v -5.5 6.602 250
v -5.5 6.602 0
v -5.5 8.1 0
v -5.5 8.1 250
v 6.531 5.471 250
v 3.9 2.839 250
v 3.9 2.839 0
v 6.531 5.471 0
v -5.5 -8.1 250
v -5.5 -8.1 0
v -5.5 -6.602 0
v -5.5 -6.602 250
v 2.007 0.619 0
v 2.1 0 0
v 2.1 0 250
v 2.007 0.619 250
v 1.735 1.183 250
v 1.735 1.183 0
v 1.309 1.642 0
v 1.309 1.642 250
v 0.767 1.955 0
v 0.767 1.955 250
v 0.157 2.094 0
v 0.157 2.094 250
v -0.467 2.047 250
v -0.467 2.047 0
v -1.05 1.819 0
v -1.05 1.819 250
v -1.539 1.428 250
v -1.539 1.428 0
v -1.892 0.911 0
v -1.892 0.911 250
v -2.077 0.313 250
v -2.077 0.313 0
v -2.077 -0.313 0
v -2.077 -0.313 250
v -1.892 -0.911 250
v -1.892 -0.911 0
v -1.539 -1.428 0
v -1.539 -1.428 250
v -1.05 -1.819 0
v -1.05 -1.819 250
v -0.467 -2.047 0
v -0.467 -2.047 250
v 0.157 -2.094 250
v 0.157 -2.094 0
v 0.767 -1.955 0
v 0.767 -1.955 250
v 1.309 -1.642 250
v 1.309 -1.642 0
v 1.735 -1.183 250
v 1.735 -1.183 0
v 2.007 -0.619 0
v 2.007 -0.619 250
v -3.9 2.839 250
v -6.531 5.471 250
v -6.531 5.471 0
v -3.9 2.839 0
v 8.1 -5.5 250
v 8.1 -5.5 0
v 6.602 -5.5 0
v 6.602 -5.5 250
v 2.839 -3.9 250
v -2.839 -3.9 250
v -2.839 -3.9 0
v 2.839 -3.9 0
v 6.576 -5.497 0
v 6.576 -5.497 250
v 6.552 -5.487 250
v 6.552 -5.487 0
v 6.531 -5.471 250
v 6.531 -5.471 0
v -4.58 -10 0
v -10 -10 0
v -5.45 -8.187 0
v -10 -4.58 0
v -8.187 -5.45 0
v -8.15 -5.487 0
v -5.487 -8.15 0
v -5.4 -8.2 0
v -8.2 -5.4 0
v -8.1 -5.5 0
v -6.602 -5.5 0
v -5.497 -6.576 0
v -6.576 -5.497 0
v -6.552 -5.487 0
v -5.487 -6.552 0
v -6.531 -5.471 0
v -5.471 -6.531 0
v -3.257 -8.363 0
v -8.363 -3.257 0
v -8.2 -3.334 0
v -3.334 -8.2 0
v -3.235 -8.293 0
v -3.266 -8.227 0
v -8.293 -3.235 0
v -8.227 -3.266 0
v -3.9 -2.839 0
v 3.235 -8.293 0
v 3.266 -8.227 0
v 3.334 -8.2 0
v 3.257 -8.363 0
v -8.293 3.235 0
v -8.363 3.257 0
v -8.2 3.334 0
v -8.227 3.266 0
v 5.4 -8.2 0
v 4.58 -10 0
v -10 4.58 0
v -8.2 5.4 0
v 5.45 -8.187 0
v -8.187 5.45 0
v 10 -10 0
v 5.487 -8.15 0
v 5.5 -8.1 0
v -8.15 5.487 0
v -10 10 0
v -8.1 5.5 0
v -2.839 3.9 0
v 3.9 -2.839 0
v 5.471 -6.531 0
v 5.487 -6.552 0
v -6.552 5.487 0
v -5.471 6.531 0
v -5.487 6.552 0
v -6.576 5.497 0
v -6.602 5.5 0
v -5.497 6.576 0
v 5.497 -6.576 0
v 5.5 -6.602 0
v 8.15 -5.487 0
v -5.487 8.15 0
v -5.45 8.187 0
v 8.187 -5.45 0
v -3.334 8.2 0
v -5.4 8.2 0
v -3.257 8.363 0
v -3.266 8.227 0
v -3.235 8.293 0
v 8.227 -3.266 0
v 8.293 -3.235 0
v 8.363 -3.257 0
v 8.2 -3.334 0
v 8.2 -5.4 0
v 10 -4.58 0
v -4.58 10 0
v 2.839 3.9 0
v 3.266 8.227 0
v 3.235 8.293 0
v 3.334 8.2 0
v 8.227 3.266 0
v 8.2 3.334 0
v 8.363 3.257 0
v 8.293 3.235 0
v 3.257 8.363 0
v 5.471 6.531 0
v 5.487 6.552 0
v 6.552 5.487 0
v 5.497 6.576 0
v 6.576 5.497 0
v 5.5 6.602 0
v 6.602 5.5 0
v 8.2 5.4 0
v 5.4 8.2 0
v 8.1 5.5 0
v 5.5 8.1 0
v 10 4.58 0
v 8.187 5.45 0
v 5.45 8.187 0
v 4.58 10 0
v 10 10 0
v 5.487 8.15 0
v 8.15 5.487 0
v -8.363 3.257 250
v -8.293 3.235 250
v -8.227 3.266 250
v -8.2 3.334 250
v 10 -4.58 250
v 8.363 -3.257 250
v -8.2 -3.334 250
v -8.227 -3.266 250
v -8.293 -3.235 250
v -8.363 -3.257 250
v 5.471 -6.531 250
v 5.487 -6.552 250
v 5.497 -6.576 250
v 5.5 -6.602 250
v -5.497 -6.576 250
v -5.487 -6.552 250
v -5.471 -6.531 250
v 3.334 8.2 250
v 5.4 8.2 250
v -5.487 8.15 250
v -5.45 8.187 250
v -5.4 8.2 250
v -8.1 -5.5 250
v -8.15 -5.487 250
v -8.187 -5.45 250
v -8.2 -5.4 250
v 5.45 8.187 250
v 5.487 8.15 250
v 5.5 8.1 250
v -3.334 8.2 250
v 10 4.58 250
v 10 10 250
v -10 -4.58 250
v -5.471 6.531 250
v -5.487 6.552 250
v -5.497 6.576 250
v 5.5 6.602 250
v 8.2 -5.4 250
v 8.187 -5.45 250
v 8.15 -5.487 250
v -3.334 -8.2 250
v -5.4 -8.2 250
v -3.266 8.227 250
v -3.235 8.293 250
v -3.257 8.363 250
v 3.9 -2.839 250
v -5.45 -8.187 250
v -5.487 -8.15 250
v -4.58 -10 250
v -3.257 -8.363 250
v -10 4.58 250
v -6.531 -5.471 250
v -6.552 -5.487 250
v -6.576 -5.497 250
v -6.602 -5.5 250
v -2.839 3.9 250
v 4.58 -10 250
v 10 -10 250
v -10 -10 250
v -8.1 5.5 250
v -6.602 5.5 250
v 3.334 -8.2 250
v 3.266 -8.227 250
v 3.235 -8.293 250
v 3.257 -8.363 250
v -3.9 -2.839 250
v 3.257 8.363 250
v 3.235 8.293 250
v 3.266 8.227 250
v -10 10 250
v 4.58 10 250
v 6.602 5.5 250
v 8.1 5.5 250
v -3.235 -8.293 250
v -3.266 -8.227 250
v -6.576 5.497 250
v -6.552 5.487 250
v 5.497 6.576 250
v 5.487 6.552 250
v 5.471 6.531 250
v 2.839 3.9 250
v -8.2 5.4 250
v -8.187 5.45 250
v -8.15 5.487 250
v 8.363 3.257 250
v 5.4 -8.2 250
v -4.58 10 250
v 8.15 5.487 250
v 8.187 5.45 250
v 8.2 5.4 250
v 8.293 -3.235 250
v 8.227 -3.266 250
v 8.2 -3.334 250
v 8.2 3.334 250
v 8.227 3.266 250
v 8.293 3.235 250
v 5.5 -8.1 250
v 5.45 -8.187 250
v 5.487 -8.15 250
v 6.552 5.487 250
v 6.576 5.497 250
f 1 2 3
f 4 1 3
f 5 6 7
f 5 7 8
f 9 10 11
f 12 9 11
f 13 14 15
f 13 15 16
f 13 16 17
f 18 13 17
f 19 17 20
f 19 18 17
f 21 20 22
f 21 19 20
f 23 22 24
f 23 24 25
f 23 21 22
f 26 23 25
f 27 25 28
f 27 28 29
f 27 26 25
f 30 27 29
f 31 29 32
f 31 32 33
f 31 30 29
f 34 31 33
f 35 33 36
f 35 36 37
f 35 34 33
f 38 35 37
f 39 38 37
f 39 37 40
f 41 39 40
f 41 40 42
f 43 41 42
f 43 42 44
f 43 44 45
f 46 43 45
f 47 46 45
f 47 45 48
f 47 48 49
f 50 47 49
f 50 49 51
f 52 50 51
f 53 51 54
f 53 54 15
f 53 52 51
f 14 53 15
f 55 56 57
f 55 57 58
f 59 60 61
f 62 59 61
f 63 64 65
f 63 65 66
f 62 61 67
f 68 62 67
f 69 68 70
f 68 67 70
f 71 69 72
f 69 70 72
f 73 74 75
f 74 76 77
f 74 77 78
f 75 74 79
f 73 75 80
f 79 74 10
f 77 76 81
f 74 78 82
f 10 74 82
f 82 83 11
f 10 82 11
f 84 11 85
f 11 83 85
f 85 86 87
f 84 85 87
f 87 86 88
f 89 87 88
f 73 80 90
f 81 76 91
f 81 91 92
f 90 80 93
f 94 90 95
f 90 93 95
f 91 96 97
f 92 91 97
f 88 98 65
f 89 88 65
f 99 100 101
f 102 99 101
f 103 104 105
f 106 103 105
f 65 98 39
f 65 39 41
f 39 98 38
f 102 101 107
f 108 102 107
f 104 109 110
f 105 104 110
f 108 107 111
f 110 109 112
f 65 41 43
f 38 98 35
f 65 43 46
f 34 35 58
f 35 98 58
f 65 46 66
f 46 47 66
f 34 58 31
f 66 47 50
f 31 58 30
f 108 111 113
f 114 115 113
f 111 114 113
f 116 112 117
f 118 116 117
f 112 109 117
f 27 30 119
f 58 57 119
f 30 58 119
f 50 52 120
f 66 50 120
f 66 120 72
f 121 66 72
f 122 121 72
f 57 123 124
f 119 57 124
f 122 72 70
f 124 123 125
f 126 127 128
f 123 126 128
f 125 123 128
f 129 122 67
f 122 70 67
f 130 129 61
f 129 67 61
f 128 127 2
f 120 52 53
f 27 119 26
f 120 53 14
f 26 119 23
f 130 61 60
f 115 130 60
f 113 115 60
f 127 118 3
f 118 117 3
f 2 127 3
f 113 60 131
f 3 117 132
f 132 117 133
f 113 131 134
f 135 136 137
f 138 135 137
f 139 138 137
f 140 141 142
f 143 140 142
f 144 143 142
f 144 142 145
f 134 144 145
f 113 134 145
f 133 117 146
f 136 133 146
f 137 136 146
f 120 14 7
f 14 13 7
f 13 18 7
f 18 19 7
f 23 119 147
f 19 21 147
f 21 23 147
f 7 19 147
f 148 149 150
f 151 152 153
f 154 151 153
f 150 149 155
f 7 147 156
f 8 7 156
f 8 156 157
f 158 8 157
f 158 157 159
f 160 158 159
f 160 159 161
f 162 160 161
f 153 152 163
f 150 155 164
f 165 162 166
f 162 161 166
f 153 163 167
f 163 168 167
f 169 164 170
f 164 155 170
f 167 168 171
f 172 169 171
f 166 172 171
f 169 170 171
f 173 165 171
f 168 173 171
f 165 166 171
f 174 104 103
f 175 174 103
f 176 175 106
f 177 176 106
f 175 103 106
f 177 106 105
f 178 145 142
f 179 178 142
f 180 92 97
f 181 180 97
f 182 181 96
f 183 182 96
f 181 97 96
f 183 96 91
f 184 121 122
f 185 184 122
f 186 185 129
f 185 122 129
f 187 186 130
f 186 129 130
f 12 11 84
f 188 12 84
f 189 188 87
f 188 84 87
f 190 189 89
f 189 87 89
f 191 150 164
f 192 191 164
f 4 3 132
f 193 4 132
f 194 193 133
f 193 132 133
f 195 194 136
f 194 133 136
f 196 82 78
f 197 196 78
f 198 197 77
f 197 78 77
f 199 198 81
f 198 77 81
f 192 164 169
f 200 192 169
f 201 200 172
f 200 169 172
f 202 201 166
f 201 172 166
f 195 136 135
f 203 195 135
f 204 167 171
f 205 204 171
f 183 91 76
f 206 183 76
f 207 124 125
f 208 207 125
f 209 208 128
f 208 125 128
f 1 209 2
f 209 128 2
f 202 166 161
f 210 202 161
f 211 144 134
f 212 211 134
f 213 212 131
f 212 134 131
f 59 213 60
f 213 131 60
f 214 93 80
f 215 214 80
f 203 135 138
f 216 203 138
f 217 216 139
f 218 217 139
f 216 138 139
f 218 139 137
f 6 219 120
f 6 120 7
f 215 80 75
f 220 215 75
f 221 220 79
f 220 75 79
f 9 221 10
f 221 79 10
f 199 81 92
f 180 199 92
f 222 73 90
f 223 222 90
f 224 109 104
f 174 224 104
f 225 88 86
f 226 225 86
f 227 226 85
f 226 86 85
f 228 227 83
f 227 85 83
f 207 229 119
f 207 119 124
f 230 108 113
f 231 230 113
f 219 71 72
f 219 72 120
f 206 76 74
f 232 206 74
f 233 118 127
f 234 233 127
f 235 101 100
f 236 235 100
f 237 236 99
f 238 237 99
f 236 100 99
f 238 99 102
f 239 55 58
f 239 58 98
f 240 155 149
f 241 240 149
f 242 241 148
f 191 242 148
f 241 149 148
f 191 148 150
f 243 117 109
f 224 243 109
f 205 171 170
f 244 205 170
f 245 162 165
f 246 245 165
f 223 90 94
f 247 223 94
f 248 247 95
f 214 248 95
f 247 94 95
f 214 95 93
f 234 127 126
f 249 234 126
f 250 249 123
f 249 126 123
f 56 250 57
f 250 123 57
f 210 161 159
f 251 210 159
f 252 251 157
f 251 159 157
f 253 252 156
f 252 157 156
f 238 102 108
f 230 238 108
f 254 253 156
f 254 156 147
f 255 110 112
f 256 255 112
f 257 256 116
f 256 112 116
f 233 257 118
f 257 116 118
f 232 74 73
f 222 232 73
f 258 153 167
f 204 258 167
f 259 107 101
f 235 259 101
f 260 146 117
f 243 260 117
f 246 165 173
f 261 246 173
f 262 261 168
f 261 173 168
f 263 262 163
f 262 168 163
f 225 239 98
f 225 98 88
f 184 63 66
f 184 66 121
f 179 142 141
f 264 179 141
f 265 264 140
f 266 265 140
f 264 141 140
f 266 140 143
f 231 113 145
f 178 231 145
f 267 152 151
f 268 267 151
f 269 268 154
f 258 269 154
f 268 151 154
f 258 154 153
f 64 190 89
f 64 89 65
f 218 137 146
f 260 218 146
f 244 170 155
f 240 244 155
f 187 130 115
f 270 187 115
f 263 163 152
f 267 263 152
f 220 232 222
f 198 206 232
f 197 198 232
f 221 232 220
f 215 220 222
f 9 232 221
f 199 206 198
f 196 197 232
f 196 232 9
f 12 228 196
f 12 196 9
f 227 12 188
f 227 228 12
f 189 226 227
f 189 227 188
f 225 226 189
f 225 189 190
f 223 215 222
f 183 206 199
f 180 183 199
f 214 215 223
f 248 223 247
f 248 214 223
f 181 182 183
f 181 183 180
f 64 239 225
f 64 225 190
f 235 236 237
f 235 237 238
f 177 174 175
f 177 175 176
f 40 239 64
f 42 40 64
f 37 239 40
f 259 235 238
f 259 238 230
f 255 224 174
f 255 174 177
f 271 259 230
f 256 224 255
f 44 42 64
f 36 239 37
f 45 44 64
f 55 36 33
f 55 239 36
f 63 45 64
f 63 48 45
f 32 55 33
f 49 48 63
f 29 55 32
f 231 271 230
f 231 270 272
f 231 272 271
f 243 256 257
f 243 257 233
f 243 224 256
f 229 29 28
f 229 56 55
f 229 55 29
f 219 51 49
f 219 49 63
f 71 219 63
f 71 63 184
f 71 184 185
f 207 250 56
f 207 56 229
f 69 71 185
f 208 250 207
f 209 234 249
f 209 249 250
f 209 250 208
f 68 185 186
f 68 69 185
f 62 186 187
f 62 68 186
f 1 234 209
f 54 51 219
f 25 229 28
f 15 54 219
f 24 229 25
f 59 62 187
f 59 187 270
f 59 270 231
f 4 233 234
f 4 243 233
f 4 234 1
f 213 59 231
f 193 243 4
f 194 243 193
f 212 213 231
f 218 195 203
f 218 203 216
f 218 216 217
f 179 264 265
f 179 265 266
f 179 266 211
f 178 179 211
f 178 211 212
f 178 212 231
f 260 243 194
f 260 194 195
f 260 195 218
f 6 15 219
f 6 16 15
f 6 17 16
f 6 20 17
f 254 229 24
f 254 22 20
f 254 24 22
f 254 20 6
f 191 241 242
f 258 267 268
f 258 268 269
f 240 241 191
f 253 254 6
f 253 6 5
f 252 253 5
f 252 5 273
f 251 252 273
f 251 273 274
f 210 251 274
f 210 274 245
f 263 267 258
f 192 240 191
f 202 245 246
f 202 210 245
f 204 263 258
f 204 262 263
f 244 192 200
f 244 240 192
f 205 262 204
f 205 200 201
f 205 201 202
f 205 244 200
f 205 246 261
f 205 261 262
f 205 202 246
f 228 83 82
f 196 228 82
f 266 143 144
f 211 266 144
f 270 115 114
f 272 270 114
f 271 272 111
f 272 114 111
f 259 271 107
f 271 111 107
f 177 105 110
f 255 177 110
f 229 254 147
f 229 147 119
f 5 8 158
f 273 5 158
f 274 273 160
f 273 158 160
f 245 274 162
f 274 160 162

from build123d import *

# Parameters (mm, degrees)
SKETCH1_R           = 2.1
BOSS_EXTRUDE1_DEPTH = 250


with BuildPart() as part:
    # Sketch1 → Boss-Extrude1 (new body)
    with BuildSketch(Plane.XY):
        with BuildLine():
            Line((-2.839339828, 3.9), (-5.470710678, 6.53137085))
            ThreePointArc((-5.470710678, 6.53137085), (-5.492387953, 6.563813185), (-5.5, 6.602081528))
            Line((-5.5, 6.602081528), (-5.5, 8.1))
            ThreePointArc((-5.5, 8.1), (-5.470710678, 8.170710678), (-5.4, 8.2))
            Line((-5.4, 8.2), (-3.334418044, 8.2))
            ThreePointArc((-3.334418044, 8.2), (-3.244178397, 8.256909326), (-3.2566483, 8.362863876))
            Line((-3.2566483, 8.362863876), (-4.58, 10))
            Line((-4.58, 10), (-10, 10))
            Line((-10, 10), (-10, 4.58))
            Line((-10, 4.58), (-8.362863876, 3.2566483))
            ThreePointArc((-8.362863876, 3.2566483), (-8.256909326, 3.244178397), (-8.2, 3.334418044))
            Line((-8.2, 3.334418044), (-8.2, 5.4))
            ThreePointArc((-8.2, 5.4), (-8.170710678, 5.470710678), (-8.1, 5.5))
            Line((-8.1, 5.5), (-6.602081528, 5.5))
            ThreePointArc((-6.602081528, 5.5), (-6.563813185, 5.492387953), (-6.53137085, 5.470710678))
            Line((-6.53137085, 5.470710678), (-3.9, 2.839339828))
            Line((-3.9, 2.839339828), (-3.9, -2.839339828))
            Line((-3.9, -2.839339828), (-6.53137085, -5.470710678))
            ThreePointArc((-6.53137085, -5.470710678), (-6.563813185, -5.492387953), (-6.602081528, -5.5))
            Line((-6.602081528, -5.5), (-8.1, -5.5))
            ThreePointArc((-8.1, -5.5), (-8.170710678, -5.470710678), (-8.2, -5.4))
            Line((-8.2, -5.4), (-8.2, -3.334418044))
            ThreePointArc((-8.2, -3.334418044), (-8.256909326, -3.244178397), (-8.362863876, -3.2566483))
            Line((-8.362863876, -3.2566483), (-10, -4.58))
            Line((-10, -4.58), (-10, -10))
            Line((-10, -10), (-4.58, -10))
            Line((-4.58, -10), (-3.2566483, -8.362863876))
            ThreePointArc((-3.2566483, -8.362863876), (-3.244178397, -8.256909326), (-3.334418044, -8.2))
            Line((-3.334418044, -8.2), (-5.4, -8.2))
            ThreePointArc((-5.4, -8.2), (-5.470710678, -8.170710678), (-5.5, -8.1))
            Line((-5.5, -8.1), (-5.5, -6.602081528))
            ThreePointArc((-5.5, -6.602081528), (-5.492387953, -6.563813185), (-5.470710678, -6.53137085))
            Line((-5.470710678, -6.53137085), (-2.839339828, -3.9))
            Line((-2.839339828, -3.9), (2.839339828, -3.9))
            Line((2.839339828, -3.9), (5.470710678, -6.53137085))
            ThreePointArc((5.470710678, -6.53137085), (5.492387953, -6.563813185), (5.5, -6.602081528))
            Line((5.5, -6.602081528), (5.5, -8.1))
            ThreePointArc((5.5, -8.1), (5.470710678, -8.170710678), (5.4, -8.2))
            Line((5.4, -8.2), (3.334418044, -8.2))
            ThreePointArc((3.334418044, -8.2), (3.244178397, -8.256909326), (3.2566483, -8.362863876))
            Line((3.2566483, -8.362863876), (4.58, -10))
            Line((4.58, -10), (10, -10))
            Line((10, -10), (10, -4.58))
            Line((10, -4.58), (8.362863876, -3.2566483))
            ThreePointArc((8.362863876, -3.2566483), (8.256909326, -3.244178397), (8.2, -3.334418044))
            Line((8.2, -3.334418044), (8.2, -5.4))
            ThreePointArc((8.2, -5.4), (8.170710678, -5.470710678), (8.1, -5.5))
            Line((8.1, -5.5), (6.602081528, -5.5))
            ThreePointArc((6.602081528, -5.5), (6.563813185, -5.492387953), (6.53137085, -5.470710678))
            Line((6.53137085, -5.470710678), (3.9, -2.839339828))
            Line((3.9, -2.839339828), (3.9, 2.839339828))
            Line((3.9, 2.839339828), (6.53137085, 5.470710678))
            ThreePointArc((6.53137085, 5.470710678), (6.563813185, 5.492387953), (6.602081528, 5.5))
            Line((6.602081528, 5.5), (8.1, 5.5))
            ThreePointArc((8.1, 5.5), (8.170710678, 5.470710678), (8.2, 5.4))
            Line((8.2, 5.4), (8.2, 3.334418044))
            ThreePointArc((8.2, 3.334418044), (8.256909326, 3.244178397), (8.362863876, 3.2566483))
            Line((8.362863876, 3.2566483), (10, 4.58))
            Line((10, 4.58), (10, 10))
            Line((10, 10), (4.58, 10))
            Line((4.58, 10), (3.2566483, 8.362863876))
            ThreePointArc((3.2566483, 8.362863876), (3.244178397, 8.256909326), (3.334418044, 8.2))
            Line((3.334418044, 8.2), (5.4, 8.2))
            ThreePointArc((5.4, 8.2), (5.470710678, 8.170710678), (5.5, 8.1))
            Line((5.5, 8.1), (5.5, 6.602081528))
            ThreePointArc((5.5, 6.602081528), (5.492387953, 6.563813185), (5.470710678, 6.53137085))
            Line((5.470710678, 6.53137085), (2.839339828, 3.9))
            Line((2.839339828, 3.9), (-2.839339828, 3.9))
        make_face()
        Circle(SKETCH1_R, mode=Mode.SUBTRACT)
    extrude(amount=BOSS_EXTRUDE1_DEPTH)


solid = part.part
